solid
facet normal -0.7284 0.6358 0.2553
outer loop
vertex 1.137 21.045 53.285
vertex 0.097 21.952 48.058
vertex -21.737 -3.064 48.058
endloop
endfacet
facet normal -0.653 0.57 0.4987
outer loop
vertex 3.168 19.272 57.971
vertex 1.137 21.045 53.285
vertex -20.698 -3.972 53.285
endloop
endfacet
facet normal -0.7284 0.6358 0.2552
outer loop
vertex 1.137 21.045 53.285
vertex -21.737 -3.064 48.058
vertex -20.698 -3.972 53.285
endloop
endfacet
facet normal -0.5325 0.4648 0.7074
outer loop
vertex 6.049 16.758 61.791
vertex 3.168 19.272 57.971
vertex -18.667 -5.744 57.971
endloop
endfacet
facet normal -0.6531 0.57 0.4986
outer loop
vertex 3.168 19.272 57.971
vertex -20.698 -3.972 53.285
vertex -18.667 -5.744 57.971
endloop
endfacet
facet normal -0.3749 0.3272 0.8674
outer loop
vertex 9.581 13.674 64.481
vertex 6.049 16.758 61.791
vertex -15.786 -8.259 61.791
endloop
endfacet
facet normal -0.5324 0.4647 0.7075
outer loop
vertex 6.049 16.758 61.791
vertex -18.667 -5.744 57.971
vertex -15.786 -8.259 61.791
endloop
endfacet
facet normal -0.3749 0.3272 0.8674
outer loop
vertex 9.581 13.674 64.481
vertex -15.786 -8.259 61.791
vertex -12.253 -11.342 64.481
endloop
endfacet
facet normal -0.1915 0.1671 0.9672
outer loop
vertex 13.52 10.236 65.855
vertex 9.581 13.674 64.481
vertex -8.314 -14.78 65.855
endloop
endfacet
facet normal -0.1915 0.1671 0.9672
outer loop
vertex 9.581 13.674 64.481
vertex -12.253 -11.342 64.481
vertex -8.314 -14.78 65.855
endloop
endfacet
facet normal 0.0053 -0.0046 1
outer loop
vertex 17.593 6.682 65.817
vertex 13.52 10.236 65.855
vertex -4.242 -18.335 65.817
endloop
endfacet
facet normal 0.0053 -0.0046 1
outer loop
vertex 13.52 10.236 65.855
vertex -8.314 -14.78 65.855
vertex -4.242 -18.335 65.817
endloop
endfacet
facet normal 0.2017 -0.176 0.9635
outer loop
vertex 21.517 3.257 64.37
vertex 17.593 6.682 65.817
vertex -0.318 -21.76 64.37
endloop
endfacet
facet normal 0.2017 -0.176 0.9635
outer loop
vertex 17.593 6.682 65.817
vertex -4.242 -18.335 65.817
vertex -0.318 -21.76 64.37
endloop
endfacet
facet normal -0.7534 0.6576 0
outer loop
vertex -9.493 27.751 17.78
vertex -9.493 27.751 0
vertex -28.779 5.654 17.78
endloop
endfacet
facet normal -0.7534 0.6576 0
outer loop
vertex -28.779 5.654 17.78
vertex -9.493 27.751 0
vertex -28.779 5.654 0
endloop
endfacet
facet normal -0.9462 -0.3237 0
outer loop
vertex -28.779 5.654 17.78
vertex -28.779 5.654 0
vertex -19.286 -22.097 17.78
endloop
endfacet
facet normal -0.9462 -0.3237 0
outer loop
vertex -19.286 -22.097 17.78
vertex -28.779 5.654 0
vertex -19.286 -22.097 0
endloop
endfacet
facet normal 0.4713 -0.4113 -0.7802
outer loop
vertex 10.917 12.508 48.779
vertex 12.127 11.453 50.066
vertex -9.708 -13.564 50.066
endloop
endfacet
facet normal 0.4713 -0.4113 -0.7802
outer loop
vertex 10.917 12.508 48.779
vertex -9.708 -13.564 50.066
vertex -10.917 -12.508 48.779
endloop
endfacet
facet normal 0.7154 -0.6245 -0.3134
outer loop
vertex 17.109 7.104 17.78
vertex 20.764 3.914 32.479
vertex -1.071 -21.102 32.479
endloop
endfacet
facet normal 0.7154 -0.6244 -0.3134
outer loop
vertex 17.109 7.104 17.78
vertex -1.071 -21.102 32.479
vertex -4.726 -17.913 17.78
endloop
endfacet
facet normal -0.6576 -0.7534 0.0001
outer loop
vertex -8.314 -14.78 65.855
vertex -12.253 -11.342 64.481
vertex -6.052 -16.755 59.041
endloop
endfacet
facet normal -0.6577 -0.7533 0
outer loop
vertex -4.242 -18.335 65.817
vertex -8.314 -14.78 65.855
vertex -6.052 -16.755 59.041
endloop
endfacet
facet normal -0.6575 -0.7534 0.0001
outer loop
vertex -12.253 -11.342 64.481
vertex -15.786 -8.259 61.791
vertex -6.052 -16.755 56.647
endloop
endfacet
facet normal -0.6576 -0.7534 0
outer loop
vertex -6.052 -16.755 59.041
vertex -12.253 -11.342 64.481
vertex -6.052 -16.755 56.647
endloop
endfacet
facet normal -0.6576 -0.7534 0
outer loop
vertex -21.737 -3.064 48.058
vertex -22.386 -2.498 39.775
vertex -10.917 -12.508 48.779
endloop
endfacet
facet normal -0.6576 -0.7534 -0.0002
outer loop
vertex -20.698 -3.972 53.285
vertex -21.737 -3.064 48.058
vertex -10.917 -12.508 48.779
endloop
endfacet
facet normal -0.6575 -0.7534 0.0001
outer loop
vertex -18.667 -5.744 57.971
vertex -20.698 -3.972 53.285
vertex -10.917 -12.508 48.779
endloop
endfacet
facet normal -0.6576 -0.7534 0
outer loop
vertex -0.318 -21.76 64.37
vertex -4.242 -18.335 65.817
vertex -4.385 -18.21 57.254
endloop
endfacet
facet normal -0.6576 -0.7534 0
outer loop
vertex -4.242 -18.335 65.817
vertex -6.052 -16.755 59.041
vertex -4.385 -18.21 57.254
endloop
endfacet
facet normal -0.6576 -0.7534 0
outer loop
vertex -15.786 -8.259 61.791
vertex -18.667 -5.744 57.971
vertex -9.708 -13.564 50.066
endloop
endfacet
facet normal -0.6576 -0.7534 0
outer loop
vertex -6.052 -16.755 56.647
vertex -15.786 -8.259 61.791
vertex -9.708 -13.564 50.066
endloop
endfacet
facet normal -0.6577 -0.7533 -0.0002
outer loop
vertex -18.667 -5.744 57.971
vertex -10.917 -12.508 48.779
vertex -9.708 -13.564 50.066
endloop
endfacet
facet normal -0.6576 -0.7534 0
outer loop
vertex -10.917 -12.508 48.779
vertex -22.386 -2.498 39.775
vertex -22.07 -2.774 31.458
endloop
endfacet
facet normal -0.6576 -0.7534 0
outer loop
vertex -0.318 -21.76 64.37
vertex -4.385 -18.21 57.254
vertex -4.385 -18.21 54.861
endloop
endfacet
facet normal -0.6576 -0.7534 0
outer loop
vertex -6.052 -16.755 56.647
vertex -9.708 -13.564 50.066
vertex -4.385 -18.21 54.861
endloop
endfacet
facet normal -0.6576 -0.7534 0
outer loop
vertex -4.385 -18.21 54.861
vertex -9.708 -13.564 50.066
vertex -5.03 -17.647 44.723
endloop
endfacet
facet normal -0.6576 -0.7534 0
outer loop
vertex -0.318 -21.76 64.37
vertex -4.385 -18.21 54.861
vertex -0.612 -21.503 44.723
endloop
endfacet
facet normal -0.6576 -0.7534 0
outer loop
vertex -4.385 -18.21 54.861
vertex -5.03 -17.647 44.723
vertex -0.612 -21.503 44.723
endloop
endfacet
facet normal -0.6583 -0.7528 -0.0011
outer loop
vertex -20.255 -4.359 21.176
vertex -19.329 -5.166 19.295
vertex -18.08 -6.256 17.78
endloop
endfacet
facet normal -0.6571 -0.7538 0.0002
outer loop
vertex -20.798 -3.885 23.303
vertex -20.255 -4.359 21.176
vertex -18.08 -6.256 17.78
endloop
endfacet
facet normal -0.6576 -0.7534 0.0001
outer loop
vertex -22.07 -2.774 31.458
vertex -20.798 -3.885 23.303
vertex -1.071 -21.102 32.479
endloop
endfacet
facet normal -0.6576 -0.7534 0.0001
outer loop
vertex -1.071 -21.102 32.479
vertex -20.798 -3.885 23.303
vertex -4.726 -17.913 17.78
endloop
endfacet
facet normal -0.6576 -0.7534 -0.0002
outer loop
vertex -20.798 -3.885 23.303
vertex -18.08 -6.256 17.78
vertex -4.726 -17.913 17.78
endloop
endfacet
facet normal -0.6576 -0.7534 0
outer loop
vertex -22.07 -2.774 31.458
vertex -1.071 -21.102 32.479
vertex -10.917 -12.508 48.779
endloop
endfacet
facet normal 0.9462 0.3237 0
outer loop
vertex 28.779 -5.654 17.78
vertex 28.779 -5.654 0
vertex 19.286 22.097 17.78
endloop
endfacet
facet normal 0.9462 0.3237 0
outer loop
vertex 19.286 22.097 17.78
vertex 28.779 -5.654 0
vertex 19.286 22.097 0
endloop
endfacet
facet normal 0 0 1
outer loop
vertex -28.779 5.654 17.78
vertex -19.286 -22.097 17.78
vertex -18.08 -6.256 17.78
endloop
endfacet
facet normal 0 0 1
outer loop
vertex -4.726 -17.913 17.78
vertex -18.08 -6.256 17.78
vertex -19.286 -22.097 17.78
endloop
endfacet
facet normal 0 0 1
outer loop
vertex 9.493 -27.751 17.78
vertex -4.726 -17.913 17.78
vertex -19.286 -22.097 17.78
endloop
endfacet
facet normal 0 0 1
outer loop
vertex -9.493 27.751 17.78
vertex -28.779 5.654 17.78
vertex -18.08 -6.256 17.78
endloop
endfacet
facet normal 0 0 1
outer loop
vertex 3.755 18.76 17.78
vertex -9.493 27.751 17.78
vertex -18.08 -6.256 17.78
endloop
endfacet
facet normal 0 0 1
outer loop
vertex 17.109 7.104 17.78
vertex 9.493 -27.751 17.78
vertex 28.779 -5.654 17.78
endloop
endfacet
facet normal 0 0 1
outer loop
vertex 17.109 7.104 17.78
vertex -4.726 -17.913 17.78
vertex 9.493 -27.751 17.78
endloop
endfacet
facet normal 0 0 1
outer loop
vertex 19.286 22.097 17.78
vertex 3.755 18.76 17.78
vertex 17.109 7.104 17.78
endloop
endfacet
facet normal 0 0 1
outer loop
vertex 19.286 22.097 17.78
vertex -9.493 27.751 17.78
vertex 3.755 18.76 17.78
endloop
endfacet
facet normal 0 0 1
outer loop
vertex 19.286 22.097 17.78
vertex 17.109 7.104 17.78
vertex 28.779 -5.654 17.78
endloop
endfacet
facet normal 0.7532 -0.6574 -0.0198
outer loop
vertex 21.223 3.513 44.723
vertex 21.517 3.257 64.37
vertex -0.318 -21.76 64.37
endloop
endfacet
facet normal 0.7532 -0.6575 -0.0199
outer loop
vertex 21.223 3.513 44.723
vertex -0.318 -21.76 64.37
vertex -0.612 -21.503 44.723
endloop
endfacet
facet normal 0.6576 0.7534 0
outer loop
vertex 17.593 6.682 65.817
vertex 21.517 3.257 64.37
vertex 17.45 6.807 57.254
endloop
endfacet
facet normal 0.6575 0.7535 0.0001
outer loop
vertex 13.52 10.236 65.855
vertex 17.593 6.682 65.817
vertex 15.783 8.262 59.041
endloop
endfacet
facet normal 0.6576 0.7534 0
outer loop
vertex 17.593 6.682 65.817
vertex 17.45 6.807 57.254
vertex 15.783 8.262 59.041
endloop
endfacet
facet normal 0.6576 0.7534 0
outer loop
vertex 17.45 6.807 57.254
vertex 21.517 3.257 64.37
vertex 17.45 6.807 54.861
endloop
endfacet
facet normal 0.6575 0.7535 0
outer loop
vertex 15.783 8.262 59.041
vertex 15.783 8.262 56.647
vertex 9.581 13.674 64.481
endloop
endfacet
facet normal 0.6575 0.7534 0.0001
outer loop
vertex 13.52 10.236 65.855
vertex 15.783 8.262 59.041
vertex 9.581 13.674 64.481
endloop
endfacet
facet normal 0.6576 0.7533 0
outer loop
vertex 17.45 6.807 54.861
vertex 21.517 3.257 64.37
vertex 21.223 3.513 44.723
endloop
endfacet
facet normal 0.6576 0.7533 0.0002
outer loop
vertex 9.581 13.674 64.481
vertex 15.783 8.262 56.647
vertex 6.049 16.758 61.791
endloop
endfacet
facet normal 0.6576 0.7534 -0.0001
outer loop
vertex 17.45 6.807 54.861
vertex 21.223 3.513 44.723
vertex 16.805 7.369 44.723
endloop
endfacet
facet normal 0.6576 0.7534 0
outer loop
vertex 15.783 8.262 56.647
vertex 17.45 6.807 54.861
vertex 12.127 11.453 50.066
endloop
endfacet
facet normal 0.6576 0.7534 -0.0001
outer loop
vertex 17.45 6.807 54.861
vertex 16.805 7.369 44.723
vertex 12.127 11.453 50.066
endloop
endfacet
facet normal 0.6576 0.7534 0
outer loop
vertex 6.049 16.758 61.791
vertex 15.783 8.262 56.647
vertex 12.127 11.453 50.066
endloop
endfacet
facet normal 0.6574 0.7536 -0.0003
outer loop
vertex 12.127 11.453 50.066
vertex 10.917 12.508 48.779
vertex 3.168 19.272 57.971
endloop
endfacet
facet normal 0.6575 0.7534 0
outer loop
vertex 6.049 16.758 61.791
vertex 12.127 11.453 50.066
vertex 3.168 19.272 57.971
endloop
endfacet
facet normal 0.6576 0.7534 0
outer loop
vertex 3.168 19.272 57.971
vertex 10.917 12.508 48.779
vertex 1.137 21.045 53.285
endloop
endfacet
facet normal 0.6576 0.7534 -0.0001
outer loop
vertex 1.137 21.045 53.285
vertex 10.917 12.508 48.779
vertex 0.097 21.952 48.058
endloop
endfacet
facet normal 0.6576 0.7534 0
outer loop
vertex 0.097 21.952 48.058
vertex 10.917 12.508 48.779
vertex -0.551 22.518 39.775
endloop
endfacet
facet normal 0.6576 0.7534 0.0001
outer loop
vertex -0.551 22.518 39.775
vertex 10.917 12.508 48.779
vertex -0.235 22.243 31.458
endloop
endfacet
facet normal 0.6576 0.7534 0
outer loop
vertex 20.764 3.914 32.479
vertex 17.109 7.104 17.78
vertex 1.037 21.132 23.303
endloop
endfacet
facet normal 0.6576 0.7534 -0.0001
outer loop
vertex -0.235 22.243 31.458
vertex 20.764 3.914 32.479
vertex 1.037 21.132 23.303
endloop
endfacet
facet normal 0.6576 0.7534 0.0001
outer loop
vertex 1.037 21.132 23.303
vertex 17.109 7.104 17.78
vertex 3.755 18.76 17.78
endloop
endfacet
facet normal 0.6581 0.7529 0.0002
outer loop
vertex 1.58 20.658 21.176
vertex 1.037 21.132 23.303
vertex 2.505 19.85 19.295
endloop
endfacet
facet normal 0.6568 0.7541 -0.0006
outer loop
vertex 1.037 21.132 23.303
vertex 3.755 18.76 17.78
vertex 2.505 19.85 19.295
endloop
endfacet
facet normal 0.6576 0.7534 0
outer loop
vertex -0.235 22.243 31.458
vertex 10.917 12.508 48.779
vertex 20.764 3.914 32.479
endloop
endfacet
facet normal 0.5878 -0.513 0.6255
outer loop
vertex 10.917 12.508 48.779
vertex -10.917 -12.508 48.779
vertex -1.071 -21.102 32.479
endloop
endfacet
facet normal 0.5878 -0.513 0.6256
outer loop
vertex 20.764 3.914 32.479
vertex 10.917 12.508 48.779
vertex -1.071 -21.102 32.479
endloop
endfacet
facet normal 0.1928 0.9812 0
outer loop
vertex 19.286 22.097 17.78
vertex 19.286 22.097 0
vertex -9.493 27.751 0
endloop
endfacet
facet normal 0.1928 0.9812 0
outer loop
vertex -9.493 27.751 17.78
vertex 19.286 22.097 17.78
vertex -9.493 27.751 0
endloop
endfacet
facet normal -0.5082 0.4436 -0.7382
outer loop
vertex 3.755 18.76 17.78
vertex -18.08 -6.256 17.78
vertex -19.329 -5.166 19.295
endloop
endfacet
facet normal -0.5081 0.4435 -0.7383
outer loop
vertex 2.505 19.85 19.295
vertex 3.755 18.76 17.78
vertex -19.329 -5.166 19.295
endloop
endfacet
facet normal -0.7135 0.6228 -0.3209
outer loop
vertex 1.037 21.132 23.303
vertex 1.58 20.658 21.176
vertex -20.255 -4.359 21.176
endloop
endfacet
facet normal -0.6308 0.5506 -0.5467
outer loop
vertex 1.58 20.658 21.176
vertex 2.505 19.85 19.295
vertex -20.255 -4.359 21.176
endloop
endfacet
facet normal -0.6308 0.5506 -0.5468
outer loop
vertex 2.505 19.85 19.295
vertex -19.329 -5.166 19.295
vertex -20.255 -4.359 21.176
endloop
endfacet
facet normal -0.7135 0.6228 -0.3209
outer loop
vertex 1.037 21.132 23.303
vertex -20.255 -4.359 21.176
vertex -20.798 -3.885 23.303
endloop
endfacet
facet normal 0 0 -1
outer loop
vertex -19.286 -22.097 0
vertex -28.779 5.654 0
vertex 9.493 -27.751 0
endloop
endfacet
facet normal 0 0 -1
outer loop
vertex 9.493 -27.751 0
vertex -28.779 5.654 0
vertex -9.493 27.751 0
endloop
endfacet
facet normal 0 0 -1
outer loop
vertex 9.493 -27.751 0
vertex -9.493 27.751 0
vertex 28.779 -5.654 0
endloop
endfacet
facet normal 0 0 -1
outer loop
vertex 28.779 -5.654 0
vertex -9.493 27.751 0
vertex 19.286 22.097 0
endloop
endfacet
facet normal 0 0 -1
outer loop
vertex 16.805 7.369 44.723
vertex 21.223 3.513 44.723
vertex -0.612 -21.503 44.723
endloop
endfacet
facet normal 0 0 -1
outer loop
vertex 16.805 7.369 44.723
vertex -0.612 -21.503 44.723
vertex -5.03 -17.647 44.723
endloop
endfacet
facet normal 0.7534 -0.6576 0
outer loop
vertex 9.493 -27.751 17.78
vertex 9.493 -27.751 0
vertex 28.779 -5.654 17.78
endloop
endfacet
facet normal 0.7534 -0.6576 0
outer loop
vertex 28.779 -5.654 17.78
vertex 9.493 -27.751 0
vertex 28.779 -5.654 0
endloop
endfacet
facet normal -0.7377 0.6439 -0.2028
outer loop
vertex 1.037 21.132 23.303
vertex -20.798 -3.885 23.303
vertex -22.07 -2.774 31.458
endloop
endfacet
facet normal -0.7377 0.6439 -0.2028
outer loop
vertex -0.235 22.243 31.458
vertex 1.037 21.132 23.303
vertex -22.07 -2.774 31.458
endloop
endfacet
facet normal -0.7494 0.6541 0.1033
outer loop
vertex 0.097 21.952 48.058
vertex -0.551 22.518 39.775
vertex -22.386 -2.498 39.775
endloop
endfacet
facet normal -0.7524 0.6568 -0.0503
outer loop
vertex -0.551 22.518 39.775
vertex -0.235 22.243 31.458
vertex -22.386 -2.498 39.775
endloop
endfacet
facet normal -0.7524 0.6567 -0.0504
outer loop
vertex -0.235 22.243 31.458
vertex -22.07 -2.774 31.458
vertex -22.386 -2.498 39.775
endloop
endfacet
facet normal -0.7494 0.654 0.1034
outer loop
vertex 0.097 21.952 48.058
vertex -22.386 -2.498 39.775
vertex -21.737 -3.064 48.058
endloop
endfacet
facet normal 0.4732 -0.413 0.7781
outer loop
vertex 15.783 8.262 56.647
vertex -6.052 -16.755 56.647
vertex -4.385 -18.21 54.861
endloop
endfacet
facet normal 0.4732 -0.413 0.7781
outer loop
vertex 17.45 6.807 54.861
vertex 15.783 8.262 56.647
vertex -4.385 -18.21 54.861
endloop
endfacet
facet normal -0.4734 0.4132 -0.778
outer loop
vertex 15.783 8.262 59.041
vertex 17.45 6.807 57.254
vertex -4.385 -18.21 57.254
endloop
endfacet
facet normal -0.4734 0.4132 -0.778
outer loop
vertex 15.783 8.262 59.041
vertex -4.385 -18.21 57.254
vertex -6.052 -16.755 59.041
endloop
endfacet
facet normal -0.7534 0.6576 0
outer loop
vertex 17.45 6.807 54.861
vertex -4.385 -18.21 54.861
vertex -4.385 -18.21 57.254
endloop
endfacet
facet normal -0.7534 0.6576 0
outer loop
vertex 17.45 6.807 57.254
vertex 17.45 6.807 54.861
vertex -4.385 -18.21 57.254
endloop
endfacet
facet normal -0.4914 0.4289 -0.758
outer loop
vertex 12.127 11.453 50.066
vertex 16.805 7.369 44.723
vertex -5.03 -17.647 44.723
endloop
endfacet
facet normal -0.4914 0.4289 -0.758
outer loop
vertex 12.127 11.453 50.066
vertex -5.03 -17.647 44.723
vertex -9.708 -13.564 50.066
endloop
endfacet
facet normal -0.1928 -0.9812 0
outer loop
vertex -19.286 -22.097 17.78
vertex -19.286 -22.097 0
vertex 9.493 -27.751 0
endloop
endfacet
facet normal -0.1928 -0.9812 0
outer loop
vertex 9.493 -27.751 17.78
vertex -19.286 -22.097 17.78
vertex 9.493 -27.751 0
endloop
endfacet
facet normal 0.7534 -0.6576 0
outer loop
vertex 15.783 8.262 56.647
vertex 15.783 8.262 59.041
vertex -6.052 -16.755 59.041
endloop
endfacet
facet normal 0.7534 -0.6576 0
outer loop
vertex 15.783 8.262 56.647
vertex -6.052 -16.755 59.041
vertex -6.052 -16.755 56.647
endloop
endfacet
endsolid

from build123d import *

# Parameters (mm, degrees)
F1_DEPTH = 17.78
F3_DEPTH = 50.8
F5_DEPTH = 76.2
F7_DEPTH = 177.8
F8_DEPTH = 177.8


# Not quite as in the source:
# - a feature names something its author has since deleted; it is built from what else it names


with BuildPart() as f1:
    # F0 (on Top) → F1 (new body)
    with BuildSketch(Plane.XY):
        Polygon((-9.4930937983, 27.7505766331), (-28.7792512331, 5.6540279267), (-19.2861574348, -22.0965487064), (9.4930937983, -27.7505766331), (28.7792512331, -5.6540279267), (19.2861574348, 22.0965487064), align=None)
    extrude(amount=F1_DEPTH)

    # F2 (on face) → F3 (join)
    with BuildSketch(Plane.XY.offset(17.78)):
        Polygon((-1.5908913392, 23.4257021287), (-23.4257021287, -1.5908913392), (1.5908913392, -23.4257021287), (23.4257021287, 1.5908913392), align=None)
    extrude(amount=F3_DEPTH)

    # F4 (on face) → F5 (cut)
    with BuildSketch(Plane(origin=(-10.9174053947, -12.508296734, 0), x_dir=(0.7533926187, -0.6575709559, 0), z_dir=(-0.6575709559, -0.7533926187, 0))):
        with BuildLine():
            Line((0, 48.7790480256), (13.0695169792, 32.4794128537))
            Line((13.0695169792, 32.4794128537), (8.2184774801, 17.78))
            Line((8.2184774801, 17.78), (16.6026271336, 17.78))
            Line((16.6026271336, 17.78), (16.6026271336, 68.58))
            Line((16.6026271336, 68.58), (-16.6026271336, 68.58))
            Line((-16.6026271336, 68.58), (-16.6026271336, 17.78))
            Line((-16.6026271336, 17.78), (-9.5075005665, 17.78))
            ThreePointArc((-9.5075005665, 17.78), (-11.8387691089, 20.1965691968), (-13.1141533635, 23.3026945488))
            ThreePointArc((-13.1141533635, 23.3026945488), (-15.1729749394, 35.6082188112), (-14.361799588, 48.0583862079))
            ThreePointArc((-14.361799588, 48.0583862079), (-4.2065001242, 63.2907896054), (14.0689240854, 64.3701831512))
            Line((14.0689240854, 64.3701831512), (13.6791784316, 44.722918421))
            Line((13.6791784316, 44.722918421), (7.8148273751, 44.722918421))
            Line((7.8148273751, 44.722918421), (1.6052529907, 50.0661861116))
            Line((1.6052529907, 50.0661861116), (0, 48.7790480256))
        make_face()
    extrude(amount=-F5_DEPTH, mode=Mode.SUBTRACT)

    # F6 (on face) → F7 (cut)
    with BuildSketch(Plane(origin=(-10.9174053947, -12.508296734, 0), x_dir=(0.7533926187, -0.6575709559, 0), z_dir=(-0.6575709559, -0.7533926187, 0))):
        Polygon((8.6703589186, 57.2541877627), (6.4581842162, 59.0407550335), (6.4581842162, 56.6472448409), (8.6703589186, 54.8606775701), align=None)
    extrude(amount=-F7_DEPTH, mode=Mode.SUBTRACT)

    # F6 (on face) → F8 (cut)
    with BuildSketch(Plane(origin=(-10.9174053947, -12.508296734, 0), x_dir=(0.7533926187, -0.6575709559, 0), z_dir=(-0.6575709559, -0.7533926187, 0))):
        Polygon((8.6703589186, 57.2541877627), (6.4581842162, 59.0407550335), (6.4581842162, 56.6472448409), (8.6703589186, 54.8606775701), align=None)
    extrude(amount=-F8_DEPTH, mode=Mode.SUBTRACT)


solid = f1.part
